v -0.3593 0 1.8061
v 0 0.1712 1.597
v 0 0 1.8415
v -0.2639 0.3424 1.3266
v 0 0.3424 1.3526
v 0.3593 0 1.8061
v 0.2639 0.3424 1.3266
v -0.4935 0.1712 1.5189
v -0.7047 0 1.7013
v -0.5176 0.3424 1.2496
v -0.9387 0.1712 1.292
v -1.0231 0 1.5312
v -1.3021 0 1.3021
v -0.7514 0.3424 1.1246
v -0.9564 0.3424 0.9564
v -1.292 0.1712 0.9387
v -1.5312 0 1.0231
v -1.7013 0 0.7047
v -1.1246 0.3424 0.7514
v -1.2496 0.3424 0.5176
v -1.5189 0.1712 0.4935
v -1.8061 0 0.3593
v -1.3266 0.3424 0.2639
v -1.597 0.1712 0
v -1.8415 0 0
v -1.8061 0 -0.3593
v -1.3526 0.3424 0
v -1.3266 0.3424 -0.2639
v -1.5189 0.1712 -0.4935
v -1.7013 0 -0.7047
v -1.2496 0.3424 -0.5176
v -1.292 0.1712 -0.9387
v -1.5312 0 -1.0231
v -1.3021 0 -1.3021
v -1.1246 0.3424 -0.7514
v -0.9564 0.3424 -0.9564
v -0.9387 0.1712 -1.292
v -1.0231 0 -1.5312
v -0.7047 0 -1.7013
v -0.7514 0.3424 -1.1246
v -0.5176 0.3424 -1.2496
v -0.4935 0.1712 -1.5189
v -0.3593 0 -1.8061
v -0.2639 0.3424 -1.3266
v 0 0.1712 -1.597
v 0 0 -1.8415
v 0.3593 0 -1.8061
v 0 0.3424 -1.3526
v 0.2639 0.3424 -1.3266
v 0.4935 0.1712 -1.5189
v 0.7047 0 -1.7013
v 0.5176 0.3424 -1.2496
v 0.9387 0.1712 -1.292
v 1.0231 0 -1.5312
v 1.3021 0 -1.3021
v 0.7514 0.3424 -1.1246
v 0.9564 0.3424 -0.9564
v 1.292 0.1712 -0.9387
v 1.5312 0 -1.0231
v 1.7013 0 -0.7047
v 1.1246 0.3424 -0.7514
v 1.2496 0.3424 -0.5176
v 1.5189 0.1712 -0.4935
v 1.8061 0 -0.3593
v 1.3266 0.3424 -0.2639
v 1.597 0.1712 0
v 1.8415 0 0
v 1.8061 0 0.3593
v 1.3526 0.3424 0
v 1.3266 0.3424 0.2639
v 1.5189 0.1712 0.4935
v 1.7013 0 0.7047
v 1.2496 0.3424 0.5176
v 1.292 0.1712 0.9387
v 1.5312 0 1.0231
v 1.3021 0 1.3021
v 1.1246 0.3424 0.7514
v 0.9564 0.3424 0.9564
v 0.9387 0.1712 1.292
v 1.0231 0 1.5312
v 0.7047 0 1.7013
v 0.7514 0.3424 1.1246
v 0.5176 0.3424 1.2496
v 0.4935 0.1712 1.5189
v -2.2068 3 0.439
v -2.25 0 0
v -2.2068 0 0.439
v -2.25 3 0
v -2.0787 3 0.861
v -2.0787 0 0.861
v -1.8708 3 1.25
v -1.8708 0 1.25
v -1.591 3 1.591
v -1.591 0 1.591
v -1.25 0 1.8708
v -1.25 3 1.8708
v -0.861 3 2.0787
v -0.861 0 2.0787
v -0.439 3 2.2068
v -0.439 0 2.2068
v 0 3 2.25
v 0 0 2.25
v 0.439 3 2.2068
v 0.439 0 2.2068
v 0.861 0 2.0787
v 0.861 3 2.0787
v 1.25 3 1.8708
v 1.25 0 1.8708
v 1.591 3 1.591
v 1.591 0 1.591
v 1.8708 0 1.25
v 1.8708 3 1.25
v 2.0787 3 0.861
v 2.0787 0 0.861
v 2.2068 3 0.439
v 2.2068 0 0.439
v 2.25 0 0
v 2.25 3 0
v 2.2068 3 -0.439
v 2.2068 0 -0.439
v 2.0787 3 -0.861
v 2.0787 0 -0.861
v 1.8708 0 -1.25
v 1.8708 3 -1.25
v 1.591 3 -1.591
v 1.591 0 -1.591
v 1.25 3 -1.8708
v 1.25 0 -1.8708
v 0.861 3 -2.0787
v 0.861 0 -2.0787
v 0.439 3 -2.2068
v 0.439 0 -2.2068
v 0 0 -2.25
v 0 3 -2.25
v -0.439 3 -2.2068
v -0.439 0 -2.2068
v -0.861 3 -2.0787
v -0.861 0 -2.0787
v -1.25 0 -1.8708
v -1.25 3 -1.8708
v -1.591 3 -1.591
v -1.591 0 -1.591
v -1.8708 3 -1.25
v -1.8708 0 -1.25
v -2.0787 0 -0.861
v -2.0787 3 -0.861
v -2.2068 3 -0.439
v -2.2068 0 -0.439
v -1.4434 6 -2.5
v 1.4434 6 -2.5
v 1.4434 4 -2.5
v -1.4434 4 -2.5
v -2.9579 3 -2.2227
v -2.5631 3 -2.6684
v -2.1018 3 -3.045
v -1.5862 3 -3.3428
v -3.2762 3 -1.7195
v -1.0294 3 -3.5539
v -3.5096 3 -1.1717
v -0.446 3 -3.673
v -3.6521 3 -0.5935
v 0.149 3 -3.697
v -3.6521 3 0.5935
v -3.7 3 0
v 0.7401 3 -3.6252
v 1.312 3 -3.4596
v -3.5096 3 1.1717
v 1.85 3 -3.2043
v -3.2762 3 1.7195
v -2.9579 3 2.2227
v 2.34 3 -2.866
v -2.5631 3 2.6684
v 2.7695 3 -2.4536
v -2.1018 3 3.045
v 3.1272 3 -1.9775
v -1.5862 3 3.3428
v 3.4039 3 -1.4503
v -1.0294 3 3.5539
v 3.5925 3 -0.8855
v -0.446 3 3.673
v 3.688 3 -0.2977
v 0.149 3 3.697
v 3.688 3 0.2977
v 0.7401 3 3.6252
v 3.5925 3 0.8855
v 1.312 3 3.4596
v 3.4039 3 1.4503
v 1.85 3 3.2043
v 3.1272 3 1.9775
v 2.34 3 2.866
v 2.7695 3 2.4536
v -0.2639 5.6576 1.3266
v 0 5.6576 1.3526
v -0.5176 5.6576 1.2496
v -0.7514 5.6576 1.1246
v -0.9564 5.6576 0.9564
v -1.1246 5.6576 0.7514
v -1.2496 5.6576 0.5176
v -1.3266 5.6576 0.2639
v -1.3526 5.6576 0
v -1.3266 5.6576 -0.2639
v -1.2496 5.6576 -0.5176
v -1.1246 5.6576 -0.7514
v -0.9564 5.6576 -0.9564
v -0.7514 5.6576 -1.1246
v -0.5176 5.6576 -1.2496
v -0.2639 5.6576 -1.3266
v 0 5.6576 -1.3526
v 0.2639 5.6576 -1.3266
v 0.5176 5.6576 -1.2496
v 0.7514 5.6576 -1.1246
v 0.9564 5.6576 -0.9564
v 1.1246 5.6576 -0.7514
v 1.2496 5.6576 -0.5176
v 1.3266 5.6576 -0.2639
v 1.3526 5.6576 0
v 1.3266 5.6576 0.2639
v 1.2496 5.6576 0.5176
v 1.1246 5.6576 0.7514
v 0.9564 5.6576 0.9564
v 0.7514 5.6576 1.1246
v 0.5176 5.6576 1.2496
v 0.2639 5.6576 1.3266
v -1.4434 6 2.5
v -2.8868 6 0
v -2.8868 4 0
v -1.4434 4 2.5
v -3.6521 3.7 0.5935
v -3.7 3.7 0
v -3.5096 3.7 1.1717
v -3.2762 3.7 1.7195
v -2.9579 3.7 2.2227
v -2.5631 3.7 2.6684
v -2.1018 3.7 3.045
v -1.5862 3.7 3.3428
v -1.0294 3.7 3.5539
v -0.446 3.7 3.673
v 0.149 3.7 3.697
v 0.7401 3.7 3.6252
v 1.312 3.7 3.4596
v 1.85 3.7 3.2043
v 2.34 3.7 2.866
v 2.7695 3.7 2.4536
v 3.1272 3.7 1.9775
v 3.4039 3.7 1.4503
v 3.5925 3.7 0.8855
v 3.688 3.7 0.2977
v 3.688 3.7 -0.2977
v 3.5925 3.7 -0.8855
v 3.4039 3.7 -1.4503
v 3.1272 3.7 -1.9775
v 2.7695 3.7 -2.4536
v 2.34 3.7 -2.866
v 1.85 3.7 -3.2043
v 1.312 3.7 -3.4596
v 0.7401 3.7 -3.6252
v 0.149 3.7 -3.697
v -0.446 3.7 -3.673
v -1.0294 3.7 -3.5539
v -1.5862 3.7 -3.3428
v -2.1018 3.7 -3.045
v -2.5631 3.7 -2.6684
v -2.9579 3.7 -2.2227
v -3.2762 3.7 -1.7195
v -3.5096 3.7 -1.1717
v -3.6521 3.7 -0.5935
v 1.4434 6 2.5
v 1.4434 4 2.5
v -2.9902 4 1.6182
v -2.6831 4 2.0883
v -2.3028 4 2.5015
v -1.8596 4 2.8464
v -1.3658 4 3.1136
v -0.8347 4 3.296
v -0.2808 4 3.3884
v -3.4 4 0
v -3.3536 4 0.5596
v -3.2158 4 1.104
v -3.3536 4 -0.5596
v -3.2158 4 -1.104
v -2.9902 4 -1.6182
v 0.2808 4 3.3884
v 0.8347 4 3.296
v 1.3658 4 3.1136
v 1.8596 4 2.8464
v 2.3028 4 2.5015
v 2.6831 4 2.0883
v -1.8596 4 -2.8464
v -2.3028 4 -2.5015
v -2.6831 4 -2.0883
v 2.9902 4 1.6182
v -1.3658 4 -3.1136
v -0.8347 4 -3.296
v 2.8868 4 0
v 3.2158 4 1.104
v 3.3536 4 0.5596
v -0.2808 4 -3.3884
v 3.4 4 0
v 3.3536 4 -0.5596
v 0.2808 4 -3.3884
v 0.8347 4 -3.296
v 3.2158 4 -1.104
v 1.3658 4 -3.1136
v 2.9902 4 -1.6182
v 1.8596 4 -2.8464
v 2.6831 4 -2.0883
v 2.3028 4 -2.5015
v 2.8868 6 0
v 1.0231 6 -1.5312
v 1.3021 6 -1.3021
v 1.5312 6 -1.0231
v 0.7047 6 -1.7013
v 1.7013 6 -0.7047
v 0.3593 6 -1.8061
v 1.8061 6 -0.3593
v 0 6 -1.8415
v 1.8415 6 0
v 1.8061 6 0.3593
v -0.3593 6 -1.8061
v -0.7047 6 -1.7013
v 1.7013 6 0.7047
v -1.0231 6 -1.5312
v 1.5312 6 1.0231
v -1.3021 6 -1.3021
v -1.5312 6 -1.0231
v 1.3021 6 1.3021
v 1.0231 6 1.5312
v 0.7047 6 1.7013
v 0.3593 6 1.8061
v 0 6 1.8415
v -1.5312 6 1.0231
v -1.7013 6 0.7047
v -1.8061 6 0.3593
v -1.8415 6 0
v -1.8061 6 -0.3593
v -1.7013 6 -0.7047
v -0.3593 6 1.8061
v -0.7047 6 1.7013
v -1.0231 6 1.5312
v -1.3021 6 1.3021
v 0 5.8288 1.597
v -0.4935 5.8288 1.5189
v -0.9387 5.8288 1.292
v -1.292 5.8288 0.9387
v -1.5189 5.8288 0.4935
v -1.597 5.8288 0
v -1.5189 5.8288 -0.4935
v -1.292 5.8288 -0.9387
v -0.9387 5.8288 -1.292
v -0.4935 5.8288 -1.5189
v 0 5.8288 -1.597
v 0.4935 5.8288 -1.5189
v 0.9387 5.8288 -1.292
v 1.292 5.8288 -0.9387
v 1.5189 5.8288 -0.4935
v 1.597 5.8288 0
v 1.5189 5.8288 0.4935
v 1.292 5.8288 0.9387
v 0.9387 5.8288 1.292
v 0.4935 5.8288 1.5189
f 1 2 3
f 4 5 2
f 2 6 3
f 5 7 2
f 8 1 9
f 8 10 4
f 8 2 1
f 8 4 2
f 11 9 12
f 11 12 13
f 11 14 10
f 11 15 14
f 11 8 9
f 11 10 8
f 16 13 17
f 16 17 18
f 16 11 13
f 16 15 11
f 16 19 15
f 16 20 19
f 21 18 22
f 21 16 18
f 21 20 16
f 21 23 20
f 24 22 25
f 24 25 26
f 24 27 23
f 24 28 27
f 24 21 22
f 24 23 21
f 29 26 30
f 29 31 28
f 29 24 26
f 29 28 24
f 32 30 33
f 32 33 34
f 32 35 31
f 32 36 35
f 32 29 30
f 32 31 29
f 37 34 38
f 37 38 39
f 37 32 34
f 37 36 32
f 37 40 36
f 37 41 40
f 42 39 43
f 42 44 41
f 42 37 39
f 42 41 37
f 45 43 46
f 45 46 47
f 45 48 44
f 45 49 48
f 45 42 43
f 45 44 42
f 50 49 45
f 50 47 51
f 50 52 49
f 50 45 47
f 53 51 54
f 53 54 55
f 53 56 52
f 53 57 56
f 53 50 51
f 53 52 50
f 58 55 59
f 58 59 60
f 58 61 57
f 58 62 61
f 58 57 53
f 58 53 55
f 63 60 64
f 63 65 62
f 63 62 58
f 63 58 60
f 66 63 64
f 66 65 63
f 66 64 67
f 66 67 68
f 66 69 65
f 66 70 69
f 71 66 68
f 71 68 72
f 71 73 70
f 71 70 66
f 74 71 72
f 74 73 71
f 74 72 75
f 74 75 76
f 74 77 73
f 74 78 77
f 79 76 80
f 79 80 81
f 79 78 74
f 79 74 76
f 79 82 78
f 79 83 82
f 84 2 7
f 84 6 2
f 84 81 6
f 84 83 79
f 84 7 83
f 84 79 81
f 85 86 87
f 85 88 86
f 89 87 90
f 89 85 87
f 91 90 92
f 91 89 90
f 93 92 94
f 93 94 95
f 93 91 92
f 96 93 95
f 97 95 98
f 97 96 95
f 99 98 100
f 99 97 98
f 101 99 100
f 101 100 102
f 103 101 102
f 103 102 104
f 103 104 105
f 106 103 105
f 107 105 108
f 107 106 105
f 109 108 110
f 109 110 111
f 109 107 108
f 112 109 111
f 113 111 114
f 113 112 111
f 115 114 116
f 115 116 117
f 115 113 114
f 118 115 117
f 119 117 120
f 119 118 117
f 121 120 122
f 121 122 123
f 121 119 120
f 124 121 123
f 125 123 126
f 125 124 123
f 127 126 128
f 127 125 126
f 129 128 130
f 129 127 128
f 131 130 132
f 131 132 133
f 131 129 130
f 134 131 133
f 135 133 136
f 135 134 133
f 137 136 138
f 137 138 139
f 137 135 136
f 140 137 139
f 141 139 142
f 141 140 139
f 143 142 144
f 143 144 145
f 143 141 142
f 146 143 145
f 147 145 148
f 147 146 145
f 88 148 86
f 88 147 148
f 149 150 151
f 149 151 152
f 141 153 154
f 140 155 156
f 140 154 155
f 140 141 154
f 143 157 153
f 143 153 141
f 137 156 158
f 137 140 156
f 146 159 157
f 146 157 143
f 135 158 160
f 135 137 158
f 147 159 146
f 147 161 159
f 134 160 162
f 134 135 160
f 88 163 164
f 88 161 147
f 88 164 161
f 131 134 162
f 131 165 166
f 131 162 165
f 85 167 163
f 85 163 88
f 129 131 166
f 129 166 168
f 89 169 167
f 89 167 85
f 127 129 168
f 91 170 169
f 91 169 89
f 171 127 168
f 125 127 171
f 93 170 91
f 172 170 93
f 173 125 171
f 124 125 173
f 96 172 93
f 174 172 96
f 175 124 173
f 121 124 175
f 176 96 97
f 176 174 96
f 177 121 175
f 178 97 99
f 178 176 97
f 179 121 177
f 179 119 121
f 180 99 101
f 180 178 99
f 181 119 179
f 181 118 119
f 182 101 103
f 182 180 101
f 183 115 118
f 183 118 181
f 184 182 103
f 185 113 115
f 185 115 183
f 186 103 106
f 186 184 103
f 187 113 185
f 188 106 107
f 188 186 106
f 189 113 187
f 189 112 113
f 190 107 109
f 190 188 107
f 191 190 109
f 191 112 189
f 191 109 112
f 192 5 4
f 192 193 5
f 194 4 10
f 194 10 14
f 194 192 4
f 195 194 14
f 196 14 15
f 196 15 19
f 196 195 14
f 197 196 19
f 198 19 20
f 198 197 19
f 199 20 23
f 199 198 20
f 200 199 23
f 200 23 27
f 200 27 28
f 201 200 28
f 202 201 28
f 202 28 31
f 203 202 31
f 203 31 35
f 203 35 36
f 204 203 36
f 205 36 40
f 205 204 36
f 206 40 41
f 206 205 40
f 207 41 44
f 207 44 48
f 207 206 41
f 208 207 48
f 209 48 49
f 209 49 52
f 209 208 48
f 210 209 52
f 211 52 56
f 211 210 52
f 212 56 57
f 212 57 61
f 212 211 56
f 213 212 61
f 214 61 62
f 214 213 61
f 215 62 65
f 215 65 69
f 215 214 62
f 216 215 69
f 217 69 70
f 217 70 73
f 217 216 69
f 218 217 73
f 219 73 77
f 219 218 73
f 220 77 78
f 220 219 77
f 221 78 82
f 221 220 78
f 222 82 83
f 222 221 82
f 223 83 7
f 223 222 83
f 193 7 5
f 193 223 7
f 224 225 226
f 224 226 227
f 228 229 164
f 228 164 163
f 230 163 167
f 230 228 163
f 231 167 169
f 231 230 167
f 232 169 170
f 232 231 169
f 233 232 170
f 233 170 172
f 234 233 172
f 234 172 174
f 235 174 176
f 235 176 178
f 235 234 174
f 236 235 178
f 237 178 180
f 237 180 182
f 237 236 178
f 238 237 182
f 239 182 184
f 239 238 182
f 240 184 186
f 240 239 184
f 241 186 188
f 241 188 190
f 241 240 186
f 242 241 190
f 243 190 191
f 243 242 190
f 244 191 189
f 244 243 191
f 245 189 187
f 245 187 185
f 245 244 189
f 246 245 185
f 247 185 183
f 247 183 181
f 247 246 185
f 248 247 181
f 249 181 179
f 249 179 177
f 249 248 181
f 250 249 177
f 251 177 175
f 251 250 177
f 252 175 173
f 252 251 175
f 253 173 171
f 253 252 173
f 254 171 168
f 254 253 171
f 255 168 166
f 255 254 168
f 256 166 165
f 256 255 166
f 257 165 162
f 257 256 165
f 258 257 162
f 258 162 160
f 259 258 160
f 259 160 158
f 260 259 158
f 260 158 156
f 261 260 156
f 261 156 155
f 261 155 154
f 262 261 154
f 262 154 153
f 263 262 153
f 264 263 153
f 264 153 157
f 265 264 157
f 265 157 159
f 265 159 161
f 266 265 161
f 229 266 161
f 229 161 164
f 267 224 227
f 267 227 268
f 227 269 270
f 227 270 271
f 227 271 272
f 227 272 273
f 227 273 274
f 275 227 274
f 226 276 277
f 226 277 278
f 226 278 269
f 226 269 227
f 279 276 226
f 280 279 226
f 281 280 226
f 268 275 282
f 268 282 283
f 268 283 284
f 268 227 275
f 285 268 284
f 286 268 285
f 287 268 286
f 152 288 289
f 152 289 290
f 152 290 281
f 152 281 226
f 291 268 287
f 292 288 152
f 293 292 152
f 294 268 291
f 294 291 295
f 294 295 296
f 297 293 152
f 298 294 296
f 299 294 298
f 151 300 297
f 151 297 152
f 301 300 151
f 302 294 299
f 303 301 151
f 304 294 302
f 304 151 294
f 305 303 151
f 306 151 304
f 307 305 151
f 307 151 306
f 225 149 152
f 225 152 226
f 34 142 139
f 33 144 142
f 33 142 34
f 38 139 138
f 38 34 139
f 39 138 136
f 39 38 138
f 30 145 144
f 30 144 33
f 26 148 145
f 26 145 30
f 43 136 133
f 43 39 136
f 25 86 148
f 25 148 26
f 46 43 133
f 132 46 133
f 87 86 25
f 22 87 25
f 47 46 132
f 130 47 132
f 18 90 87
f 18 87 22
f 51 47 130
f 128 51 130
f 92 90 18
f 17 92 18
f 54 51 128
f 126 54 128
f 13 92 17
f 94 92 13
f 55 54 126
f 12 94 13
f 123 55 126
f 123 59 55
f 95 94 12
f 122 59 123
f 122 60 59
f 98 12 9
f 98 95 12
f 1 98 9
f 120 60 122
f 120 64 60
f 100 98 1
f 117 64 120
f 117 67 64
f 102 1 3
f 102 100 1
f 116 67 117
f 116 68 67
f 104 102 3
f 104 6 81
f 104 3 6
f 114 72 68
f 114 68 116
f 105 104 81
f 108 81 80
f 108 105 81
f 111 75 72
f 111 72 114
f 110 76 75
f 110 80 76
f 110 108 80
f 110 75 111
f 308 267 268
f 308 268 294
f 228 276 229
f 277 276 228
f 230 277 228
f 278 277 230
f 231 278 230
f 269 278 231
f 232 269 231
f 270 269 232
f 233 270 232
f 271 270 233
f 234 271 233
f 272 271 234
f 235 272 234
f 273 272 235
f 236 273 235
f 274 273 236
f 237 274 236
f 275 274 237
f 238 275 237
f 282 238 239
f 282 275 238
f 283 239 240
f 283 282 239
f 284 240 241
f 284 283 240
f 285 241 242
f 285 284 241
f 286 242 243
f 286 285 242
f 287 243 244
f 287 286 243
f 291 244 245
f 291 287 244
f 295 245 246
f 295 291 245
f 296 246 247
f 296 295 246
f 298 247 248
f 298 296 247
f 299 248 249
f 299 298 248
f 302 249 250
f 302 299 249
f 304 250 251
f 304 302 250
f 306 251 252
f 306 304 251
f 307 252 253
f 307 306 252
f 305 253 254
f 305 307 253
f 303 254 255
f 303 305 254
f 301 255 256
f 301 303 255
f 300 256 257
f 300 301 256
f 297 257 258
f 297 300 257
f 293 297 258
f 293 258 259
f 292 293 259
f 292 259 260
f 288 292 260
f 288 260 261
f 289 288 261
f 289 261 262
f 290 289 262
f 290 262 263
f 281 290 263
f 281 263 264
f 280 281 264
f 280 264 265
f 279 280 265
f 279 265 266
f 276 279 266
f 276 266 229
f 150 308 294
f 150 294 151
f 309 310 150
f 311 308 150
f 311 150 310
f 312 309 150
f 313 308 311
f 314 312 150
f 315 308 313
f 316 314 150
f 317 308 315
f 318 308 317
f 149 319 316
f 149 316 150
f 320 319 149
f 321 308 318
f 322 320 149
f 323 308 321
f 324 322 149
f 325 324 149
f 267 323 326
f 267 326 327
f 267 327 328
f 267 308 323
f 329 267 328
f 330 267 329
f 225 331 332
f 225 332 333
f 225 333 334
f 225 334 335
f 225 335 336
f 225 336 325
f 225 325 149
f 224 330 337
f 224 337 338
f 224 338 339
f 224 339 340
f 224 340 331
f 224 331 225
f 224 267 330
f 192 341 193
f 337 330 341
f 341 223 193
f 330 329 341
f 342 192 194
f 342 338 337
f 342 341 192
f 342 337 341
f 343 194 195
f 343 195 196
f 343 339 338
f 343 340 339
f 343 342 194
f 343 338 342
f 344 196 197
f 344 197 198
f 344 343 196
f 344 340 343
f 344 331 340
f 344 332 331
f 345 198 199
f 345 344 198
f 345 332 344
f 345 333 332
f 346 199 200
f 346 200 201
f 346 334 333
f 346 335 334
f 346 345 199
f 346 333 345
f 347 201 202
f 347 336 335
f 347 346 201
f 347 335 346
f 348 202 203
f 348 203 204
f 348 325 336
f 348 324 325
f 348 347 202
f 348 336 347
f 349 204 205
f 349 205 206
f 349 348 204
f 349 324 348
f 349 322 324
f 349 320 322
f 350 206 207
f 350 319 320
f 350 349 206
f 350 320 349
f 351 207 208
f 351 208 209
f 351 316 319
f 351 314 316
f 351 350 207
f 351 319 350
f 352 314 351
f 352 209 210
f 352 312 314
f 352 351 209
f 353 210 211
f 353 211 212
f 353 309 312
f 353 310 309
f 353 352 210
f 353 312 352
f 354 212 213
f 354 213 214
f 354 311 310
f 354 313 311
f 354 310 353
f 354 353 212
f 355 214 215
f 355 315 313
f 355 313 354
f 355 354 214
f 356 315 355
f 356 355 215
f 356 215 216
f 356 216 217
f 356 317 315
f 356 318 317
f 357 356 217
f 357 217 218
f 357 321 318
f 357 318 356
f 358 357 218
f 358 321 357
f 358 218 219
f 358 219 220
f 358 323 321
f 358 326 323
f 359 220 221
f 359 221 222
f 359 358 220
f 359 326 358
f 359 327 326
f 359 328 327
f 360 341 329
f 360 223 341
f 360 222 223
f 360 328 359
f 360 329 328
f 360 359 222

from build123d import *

# Parameters (mm, degrees)
SKETCH_7_OUTSIDE_W  = 11.812
SKETCH_7_OUTSIDE_H  = 11.812
CUT_EXTRUDE_1_DEPTH = 2
CHAMFER_1_SIZE      = 0.3


with BuildPart() as part:
    # Эскиз1 → Повернуть1 (revolve)
    with BuildSketch(Plane.XY):
        Polygon((0, 0), (-2.25, 0), (-2.25, 3), (-3.7, 3), (-3.7, 6), (0, 6), align=None)
    revolve(axis=Axis((0, 0, 0), (0, 1, 0)))

    # Эскиз3 → Отверстие обработанное метчиком #6-321 (revolve, cut)
    with BuildSketch(Plane(origin=(0, 6, 0), x_dir=(0, 0, 1), z_dir=(1, 0, 0))):
        Polygon((0, 0), (0, 6), (1.8415, 6), (1.35255, 5.657633524), (1.35255, 0.342366476), (1.8415, 0), align=None)
    revolve(axis=Axis((0, 12.35, 0), (0, -1, 0)), mode=Mode.SUBTRACT)

    # Эскиз7 outside → Вырез-Вытянуть1 (cut)
    with BuildSketch(Plane(origin=(0, 6, 0), x_dir=(1, 0, 0), z_dir=(0, 1, 0))):
        Rectangle(SKETCH_7_OUTSIDE_W, SKETCH_7_OUTSIDE_H)
        Polygon((2.886751346, 0), (1.443375673, 2.5), (-1.443375673, 2.5), (-2.886751346, 0), (-1.443375673, -2.5), (1.443375673, -2.5), align=None, mode=Mode.SUBTRACT)
    extrude(amount=-CUT_EXTRUDE_1_DEPTH, mode=Mode.SUBTRACT)

    # Фаска1
    chamfer_1_edges = [part.edges().sort_by_distance(p)[0] for p in [
        (3.7, 4, 0),
    ]]
    chamfer(chamfer_1_edges, length=CHAMFER_1_SIZE)


solid = part.part
